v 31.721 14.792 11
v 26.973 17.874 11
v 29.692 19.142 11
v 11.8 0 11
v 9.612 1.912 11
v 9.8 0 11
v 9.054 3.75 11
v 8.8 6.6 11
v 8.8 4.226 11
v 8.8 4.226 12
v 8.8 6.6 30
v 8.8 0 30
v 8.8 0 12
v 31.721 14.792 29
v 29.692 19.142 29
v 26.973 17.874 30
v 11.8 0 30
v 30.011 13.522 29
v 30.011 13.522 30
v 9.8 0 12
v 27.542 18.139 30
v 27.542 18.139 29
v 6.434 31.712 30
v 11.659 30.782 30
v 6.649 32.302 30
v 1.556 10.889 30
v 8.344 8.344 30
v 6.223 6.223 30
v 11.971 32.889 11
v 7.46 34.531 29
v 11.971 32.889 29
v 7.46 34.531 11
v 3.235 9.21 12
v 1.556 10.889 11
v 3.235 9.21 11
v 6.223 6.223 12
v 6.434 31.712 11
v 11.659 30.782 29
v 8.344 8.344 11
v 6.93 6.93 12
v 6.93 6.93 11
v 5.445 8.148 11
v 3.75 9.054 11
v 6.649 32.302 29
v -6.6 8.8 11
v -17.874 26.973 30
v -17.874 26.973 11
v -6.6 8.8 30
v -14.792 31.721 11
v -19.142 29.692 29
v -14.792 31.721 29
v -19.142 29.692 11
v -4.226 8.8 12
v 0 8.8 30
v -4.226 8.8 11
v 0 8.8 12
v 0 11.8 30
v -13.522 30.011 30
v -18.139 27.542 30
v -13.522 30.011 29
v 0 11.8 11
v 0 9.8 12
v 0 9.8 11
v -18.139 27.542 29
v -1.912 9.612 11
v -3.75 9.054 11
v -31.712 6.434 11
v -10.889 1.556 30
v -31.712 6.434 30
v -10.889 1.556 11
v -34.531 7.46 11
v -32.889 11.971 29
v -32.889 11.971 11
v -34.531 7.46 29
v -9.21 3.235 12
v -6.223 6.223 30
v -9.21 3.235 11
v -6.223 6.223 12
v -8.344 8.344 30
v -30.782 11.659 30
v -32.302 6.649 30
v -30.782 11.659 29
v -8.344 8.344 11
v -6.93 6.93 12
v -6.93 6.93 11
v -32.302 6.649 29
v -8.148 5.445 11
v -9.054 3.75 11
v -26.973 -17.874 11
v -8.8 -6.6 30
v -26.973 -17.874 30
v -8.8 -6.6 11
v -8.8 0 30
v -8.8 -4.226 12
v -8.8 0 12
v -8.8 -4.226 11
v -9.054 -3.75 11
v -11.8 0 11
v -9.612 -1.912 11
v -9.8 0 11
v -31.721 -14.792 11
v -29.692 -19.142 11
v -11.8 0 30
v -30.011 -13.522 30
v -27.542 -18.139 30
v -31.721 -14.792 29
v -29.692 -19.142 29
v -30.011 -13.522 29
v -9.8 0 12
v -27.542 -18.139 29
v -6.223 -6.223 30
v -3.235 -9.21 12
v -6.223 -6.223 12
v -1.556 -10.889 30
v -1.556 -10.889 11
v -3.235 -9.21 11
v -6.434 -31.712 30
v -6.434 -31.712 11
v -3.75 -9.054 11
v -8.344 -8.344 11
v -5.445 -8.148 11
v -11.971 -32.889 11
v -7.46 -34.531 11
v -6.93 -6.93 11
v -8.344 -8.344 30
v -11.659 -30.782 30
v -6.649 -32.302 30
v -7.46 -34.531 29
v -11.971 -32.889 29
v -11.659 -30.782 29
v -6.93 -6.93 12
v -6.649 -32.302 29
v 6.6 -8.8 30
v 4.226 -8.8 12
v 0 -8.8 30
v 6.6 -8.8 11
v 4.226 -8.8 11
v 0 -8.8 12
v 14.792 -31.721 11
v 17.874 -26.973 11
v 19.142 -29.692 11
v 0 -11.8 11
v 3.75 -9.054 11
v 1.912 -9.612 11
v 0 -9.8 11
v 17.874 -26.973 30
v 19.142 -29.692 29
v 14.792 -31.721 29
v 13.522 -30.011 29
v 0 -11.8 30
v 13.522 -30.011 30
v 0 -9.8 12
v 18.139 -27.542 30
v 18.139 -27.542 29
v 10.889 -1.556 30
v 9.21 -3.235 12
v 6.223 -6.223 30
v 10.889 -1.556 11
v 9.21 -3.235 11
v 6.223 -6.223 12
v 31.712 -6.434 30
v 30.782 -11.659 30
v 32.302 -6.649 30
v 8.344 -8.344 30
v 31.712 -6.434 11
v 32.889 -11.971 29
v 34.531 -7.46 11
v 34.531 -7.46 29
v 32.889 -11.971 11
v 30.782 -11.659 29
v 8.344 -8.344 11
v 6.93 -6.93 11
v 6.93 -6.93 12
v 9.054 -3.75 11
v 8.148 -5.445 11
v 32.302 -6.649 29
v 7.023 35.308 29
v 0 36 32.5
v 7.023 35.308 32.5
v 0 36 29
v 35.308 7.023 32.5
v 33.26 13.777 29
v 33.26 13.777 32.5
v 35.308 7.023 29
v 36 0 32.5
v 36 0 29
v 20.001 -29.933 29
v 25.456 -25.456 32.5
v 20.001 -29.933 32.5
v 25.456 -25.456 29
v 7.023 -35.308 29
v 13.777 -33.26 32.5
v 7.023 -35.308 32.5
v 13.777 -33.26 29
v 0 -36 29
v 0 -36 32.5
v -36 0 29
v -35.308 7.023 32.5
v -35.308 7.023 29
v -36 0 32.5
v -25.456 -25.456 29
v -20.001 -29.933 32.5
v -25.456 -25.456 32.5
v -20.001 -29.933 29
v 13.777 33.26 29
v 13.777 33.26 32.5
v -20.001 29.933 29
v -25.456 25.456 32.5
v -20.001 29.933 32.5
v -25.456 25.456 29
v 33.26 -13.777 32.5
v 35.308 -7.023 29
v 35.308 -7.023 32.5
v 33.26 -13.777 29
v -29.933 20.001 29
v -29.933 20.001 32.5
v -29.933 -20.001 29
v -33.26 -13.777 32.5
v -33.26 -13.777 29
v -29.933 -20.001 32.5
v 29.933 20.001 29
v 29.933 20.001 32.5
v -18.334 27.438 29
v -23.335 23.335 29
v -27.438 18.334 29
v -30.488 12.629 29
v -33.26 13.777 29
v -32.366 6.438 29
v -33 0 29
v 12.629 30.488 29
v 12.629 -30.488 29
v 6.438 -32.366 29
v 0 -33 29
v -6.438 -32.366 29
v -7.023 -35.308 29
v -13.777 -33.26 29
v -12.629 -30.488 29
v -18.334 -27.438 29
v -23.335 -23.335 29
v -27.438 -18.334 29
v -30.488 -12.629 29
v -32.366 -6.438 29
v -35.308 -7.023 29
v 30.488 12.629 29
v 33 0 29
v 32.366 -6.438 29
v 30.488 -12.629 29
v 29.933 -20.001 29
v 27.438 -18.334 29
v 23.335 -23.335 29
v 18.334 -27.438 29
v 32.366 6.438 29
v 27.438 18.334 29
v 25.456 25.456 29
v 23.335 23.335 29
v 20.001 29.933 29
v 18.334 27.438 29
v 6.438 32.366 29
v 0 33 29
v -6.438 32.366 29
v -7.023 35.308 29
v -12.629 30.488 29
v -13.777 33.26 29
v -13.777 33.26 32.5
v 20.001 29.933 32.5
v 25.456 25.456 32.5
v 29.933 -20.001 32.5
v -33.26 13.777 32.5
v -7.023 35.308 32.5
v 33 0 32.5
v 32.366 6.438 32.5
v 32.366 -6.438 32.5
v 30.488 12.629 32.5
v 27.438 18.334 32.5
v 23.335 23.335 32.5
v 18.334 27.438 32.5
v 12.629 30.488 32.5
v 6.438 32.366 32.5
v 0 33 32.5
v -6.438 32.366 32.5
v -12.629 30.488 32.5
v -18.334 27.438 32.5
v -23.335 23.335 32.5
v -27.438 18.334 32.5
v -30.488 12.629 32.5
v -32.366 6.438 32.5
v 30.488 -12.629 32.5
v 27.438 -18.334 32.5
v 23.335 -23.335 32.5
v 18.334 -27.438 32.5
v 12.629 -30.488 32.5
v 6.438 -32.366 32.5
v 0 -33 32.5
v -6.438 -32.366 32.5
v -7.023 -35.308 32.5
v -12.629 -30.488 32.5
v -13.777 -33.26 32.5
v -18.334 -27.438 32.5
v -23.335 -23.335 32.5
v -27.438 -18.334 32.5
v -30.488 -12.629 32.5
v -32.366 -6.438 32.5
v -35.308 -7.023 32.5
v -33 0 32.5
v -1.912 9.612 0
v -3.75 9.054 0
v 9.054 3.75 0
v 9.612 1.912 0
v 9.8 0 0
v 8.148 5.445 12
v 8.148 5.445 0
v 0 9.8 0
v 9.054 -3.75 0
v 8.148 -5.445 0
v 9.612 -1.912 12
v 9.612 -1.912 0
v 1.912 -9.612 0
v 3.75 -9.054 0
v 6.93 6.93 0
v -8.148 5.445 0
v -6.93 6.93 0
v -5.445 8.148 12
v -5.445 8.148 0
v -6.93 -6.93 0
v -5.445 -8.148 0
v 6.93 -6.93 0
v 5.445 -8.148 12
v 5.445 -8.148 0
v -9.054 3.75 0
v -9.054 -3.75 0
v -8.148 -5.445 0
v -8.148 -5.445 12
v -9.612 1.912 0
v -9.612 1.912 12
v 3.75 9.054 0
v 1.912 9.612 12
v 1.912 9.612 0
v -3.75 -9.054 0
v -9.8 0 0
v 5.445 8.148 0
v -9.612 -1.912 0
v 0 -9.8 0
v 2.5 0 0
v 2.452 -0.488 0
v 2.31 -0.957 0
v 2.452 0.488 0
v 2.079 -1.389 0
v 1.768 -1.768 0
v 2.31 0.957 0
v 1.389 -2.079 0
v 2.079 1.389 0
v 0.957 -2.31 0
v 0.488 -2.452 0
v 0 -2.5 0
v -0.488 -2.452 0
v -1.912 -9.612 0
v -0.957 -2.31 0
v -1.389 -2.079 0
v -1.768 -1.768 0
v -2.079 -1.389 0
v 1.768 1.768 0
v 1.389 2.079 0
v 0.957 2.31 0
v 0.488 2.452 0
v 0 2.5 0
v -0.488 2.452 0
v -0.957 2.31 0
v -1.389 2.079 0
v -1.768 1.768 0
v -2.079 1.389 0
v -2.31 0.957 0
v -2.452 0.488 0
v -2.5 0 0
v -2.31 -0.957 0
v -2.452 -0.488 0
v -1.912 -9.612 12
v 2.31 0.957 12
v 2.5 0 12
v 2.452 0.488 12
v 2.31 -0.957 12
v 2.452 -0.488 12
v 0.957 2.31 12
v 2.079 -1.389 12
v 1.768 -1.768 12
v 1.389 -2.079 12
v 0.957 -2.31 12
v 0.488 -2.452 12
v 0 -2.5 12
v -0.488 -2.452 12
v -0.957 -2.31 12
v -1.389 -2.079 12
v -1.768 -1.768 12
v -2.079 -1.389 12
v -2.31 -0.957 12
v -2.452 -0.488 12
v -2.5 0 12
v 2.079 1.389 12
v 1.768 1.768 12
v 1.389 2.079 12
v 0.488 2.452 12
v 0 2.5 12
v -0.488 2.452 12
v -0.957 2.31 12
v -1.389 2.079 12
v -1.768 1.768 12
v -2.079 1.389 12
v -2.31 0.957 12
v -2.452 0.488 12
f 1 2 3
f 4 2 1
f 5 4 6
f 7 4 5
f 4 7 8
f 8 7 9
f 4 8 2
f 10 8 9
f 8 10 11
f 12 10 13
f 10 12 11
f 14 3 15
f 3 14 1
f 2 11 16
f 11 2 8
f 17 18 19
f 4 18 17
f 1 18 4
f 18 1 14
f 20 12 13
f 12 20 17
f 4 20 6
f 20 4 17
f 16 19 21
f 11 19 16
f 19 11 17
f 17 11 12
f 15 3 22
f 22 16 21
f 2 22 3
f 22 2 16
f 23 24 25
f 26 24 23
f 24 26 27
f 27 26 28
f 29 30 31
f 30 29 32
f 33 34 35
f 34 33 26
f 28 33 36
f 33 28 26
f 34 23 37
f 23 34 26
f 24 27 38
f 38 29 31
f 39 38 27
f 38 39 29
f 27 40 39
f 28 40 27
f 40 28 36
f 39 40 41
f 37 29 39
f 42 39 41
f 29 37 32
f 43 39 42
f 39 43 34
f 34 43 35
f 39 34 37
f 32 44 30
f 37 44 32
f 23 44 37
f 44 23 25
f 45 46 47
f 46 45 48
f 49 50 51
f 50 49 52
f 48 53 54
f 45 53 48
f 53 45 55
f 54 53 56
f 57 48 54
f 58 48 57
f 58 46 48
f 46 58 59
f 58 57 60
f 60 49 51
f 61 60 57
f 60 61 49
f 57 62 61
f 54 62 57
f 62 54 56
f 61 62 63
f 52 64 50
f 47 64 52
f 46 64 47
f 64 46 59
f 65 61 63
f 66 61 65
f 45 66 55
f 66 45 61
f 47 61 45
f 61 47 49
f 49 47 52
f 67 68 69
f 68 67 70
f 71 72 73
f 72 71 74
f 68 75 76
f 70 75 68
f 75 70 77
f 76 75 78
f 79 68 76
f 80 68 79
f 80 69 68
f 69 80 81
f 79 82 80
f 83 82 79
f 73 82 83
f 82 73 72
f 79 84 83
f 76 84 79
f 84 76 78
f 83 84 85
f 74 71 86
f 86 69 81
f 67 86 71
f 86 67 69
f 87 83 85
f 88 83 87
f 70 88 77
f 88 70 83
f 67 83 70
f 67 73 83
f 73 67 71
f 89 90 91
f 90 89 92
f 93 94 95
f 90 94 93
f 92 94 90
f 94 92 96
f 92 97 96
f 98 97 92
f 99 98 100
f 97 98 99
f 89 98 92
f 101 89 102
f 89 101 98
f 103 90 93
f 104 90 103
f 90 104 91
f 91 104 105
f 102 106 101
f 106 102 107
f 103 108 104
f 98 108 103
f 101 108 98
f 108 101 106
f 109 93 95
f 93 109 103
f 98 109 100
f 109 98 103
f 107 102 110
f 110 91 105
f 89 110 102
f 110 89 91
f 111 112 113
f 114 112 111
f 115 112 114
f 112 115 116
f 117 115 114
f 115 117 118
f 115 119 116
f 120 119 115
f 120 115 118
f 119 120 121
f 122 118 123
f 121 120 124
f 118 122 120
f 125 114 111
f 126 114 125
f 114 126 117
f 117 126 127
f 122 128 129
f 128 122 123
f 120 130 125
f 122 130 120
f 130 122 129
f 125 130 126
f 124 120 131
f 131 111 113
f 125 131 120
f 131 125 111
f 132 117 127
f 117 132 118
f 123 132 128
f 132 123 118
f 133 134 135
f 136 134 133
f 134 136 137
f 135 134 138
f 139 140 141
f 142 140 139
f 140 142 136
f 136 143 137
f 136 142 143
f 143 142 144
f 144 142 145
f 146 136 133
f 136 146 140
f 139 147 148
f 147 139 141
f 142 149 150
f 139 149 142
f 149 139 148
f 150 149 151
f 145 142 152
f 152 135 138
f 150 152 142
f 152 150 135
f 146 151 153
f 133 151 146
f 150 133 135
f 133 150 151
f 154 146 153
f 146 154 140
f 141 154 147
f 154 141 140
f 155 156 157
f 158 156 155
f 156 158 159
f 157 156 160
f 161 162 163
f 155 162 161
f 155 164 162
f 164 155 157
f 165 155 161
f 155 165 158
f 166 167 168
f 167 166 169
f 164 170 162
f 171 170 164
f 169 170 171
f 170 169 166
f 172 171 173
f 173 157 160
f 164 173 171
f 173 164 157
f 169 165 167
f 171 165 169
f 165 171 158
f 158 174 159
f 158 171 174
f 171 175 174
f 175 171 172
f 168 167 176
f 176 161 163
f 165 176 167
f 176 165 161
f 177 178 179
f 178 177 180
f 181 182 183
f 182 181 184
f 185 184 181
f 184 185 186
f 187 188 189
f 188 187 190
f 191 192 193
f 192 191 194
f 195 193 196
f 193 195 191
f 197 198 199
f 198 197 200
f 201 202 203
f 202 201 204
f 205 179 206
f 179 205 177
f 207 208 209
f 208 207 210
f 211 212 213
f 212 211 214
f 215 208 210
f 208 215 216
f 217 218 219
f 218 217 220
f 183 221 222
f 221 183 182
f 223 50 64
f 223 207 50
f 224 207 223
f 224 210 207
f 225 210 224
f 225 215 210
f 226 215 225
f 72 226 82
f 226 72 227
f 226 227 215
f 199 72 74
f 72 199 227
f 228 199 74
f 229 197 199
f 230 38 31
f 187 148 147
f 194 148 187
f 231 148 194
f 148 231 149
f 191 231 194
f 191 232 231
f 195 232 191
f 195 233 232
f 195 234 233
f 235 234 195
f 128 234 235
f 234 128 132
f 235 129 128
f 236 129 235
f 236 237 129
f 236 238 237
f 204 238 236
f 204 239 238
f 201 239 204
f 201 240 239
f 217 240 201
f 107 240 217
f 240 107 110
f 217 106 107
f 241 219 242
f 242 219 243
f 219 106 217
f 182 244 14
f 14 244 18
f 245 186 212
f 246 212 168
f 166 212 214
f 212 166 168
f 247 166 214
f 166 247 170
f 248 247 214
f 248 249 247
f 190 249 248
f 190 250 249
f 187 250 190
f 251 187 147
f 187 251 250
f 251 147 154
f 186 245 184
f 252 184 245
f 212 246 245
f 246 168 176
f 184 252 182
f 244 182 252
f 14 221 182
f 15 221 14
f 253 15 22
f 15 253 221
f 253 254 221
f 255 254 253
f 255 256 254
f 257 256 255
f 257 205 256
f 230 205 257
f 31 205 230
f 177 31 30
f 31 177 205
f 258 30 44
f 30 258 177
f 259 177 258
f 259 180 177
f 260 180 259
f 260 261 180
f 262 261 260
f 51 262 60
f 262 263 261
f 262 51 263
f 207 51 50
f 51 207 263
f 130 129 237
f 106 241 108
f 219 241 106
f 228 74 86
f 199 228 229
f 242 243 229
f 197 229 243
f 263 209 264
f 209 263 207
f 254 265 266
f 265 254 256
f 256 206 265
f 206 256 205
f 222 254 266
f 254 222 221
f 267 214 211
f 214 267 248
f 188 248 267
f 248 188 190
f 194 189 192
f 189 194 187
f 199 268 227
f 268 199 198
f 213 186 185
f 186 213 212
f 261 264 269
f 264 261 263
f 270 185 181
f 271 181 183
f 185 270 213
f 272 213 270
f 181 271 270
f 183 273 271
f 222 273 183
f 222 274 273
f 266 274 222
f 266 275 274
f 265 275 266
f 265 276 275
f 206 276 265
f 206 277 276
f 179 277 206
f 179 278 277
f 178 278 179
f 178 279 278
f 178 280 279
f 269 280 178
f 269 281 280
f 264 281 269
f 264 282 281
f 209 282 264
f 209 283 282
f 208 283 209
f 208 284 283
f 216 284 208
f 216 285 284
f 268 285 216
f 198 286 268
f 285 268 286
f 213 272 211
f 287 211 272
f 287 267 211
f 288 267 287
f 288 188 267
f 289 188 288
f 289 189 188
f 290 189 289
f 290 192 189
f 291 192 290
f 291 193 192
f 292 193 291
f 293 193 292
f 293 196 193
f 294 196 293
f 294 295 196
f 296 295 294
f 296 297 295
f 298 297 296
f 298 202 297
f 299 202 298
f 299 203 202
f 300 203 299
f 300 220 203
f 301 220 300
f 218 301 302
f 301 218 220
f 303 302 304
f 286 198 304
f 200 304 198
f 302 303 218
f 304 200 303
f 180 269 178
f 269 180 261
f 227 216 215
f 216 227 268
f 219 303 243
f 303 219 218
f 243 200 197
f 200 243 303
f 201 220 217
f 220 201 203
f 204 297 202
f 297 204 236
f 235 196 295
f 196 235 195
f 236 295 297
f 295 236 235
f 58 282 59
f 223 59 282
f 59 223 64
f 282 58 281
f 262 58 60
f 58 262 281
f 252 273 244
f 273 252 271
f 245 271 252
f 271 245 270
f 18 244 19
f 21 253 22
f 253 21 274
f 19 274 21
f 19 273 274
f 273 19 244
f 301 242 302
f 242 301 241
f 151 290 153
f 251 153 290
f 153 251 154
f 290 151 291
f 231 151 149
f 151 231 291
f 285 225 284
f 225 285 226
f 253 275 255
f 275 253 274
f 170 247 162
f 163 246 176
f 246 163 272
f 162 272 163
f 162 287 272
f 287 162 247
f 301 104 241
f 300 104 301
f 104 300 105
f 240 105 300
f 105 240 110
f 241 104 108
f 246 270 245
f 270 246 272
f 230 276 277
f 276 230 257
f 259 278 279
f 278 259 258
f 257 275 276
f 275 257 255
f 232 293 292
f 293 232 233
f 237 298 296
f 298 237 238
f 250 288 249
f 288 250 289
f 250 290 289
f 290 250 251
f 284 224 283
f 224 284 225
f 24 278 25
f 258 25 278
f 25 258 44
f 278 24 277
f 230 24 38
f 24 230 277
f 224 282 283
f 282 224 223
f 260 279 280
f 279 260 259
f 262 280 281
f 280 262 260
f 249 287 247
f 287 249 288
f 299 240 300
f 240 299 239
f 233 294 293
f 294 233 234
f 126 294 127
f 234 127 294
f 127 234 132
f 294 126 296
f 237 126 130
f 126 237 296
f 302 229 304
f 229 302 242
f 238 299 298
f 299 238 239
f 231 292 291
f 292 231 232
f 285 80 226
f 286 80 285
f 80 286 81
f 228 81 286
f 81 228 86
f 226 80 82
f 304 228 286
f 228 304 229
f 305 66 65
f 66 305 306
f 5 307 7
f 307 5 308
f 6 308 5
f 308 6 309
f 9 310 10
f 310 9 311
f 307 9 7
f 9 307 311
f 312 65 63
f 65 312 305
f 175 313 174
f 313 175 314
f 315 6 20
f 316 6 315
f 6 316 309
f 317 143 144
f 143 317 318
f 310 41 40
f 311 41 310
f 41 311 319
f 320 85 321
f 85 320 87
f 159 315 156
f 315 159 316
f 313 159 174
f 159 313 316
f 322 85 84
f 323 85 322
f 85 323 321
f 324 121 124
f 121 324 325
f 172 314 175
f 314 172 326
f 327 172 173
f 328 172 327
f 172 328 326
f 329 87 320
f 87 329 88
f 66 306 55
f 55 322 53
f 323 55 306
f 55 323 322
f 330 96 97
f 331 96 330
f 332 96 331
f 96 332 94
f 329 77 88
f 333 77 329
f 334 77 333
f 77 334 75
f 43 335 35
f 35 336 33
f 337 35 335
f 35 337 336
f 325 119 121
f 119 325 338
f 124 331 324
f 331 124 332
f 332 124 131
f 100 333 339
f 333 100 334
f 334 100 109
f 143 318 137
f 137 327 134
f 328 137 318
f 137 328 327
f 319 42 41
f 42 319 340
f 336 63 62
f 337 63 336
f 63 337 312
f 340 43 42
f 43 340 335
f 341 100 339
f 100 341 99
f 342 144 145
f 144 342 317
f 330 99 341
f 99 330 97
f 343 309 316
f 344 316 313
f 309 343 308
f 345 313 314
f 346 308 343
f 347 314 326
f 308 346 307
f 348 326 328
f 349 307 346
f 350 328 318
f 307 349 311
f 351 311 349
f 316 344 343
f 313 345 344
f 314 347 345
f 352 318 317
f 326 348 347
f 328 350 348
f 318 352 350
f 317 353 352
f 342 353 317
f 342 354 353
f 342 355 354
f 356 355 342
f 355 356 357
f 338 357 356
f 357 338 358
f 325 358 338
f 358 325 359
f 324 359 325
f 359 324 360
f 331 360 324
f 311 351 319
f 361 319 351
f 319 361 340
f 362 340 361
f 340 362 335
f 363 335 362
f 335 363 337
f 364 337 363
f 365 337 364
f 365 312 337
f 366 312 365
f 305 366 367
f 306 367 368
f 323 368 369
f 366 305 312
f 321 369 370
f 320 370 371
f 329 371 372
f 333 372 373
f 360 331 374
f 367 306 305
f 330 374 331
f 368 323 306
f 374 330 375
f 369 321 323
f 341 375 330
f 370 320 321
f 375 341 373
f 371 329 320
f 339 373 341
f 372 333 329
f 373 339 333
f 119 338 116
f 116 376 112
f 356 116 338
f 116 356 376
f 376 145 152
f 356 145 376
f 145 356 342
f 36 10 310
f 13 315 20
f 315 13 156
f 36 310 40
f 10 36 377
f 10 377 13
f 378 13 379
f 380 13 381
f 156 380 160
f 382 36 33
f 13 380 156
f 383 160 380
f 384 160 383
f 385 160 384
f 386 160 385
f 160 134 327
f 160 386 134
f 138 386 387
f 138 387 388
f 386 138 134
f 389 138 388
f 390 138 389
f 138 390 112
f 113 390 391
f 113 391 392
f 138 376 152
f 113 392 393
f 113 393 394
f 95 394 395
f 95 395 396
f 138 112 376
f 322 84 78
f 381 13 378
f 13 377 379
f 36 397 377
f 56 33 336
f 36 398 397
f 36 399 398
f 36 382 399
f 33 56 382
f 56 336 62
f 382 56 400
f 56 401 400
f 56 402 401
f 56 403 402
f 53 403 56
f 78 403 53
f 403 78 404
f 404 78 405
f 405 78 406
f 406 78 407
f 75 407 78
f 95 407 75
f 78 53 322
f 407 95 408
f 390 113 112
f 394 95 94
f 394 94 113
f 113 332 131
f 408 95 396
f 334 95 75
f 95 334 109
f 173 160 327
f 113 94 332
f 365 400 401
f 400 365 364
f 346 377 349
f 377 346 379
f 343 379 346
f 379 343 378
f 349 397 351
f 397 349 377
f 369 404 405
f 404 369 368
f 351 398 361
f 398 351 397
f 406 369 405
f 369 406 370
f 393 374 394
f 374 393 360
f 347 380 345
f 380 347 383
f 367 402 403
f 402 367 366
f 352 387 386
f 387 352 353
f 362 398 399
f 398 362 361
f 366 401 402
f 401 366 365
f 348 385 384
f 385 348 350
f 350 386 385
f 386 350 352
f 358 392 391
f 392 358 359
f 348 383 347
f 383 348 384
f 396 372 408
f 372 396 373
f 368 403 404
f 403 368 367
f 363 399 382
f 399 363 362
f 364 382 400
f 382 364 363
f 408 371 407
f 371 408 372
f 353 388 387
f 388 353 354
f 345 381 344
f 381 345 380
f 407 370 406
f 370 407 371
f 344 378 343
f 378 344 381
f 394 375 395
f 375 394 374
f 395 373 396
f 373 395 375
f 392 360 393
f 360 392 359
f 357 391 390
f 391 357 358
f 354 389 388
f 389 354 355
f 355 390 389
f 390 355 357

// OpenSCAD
$fn = 32;

// ----------------------------------------------------------------------
// Impeller: 70 mm, 8 blades, 32.5 mm tall
// ----------------------------------------------------------------------

// --- parameters (mm) ---
boss_d = 19.6;            // hub diameter
boss_h = 12;              // hub height
rotor_d = 70;             // outer diameter over the blades
vane_count = 8;           // number of blades
blade_t = 3;              // blade thickness
blade_h = 18;             // blade height
blade_in_r = 8.8;         // blade root radius
blade_out_r = 32;         // blade tip radius
sweep = 25;               // blade sweep, degrees
bore_d = 5;               // shaft bore
shroud_h = 2.5;           // shroud ring thickness
shroud_d = 72;            // shroud outside diameter

module hub() {
  cylinder(h = boss_h, d = boss_d);
}

module blade() {
  /* blade swept between two boxes: hull of the root and the tip section */
  hull() {
    translate([blade_in_r, 0, boss_h - 1])
      cube([blade_t, blade_t * 2.2, blade_h + 1], center = false);
    rotate([0, 0, sweep])
      translate([blade_out_r, 0, boss_h - 1])
        cube([blade_t, blade_t * 1.6, blade_h + 1], center = false);
  }
}

module blades() {
  for (i = [0 : vane_count - 1])
    rotate([0, 0, i * 360 / vane_count]) blade();
}

module shroud() {
  translate([0, 0, boss_h + blade_h - 1])
    difference() {
      cylinder(h = shroud_h + 1, d = shroud_d);
      translate([0, 0, -1]) cylinder(h = shroud_h + 3, d = shroud_d - 2 * 3);
    }
}

difference() {
  union() {
    hub();
    blades();
    shroud();
  }
  translate([0, 0, -1]) cylinder(h = boss_h + blade_h + shroud_h + 3, d = bore_d);
}
